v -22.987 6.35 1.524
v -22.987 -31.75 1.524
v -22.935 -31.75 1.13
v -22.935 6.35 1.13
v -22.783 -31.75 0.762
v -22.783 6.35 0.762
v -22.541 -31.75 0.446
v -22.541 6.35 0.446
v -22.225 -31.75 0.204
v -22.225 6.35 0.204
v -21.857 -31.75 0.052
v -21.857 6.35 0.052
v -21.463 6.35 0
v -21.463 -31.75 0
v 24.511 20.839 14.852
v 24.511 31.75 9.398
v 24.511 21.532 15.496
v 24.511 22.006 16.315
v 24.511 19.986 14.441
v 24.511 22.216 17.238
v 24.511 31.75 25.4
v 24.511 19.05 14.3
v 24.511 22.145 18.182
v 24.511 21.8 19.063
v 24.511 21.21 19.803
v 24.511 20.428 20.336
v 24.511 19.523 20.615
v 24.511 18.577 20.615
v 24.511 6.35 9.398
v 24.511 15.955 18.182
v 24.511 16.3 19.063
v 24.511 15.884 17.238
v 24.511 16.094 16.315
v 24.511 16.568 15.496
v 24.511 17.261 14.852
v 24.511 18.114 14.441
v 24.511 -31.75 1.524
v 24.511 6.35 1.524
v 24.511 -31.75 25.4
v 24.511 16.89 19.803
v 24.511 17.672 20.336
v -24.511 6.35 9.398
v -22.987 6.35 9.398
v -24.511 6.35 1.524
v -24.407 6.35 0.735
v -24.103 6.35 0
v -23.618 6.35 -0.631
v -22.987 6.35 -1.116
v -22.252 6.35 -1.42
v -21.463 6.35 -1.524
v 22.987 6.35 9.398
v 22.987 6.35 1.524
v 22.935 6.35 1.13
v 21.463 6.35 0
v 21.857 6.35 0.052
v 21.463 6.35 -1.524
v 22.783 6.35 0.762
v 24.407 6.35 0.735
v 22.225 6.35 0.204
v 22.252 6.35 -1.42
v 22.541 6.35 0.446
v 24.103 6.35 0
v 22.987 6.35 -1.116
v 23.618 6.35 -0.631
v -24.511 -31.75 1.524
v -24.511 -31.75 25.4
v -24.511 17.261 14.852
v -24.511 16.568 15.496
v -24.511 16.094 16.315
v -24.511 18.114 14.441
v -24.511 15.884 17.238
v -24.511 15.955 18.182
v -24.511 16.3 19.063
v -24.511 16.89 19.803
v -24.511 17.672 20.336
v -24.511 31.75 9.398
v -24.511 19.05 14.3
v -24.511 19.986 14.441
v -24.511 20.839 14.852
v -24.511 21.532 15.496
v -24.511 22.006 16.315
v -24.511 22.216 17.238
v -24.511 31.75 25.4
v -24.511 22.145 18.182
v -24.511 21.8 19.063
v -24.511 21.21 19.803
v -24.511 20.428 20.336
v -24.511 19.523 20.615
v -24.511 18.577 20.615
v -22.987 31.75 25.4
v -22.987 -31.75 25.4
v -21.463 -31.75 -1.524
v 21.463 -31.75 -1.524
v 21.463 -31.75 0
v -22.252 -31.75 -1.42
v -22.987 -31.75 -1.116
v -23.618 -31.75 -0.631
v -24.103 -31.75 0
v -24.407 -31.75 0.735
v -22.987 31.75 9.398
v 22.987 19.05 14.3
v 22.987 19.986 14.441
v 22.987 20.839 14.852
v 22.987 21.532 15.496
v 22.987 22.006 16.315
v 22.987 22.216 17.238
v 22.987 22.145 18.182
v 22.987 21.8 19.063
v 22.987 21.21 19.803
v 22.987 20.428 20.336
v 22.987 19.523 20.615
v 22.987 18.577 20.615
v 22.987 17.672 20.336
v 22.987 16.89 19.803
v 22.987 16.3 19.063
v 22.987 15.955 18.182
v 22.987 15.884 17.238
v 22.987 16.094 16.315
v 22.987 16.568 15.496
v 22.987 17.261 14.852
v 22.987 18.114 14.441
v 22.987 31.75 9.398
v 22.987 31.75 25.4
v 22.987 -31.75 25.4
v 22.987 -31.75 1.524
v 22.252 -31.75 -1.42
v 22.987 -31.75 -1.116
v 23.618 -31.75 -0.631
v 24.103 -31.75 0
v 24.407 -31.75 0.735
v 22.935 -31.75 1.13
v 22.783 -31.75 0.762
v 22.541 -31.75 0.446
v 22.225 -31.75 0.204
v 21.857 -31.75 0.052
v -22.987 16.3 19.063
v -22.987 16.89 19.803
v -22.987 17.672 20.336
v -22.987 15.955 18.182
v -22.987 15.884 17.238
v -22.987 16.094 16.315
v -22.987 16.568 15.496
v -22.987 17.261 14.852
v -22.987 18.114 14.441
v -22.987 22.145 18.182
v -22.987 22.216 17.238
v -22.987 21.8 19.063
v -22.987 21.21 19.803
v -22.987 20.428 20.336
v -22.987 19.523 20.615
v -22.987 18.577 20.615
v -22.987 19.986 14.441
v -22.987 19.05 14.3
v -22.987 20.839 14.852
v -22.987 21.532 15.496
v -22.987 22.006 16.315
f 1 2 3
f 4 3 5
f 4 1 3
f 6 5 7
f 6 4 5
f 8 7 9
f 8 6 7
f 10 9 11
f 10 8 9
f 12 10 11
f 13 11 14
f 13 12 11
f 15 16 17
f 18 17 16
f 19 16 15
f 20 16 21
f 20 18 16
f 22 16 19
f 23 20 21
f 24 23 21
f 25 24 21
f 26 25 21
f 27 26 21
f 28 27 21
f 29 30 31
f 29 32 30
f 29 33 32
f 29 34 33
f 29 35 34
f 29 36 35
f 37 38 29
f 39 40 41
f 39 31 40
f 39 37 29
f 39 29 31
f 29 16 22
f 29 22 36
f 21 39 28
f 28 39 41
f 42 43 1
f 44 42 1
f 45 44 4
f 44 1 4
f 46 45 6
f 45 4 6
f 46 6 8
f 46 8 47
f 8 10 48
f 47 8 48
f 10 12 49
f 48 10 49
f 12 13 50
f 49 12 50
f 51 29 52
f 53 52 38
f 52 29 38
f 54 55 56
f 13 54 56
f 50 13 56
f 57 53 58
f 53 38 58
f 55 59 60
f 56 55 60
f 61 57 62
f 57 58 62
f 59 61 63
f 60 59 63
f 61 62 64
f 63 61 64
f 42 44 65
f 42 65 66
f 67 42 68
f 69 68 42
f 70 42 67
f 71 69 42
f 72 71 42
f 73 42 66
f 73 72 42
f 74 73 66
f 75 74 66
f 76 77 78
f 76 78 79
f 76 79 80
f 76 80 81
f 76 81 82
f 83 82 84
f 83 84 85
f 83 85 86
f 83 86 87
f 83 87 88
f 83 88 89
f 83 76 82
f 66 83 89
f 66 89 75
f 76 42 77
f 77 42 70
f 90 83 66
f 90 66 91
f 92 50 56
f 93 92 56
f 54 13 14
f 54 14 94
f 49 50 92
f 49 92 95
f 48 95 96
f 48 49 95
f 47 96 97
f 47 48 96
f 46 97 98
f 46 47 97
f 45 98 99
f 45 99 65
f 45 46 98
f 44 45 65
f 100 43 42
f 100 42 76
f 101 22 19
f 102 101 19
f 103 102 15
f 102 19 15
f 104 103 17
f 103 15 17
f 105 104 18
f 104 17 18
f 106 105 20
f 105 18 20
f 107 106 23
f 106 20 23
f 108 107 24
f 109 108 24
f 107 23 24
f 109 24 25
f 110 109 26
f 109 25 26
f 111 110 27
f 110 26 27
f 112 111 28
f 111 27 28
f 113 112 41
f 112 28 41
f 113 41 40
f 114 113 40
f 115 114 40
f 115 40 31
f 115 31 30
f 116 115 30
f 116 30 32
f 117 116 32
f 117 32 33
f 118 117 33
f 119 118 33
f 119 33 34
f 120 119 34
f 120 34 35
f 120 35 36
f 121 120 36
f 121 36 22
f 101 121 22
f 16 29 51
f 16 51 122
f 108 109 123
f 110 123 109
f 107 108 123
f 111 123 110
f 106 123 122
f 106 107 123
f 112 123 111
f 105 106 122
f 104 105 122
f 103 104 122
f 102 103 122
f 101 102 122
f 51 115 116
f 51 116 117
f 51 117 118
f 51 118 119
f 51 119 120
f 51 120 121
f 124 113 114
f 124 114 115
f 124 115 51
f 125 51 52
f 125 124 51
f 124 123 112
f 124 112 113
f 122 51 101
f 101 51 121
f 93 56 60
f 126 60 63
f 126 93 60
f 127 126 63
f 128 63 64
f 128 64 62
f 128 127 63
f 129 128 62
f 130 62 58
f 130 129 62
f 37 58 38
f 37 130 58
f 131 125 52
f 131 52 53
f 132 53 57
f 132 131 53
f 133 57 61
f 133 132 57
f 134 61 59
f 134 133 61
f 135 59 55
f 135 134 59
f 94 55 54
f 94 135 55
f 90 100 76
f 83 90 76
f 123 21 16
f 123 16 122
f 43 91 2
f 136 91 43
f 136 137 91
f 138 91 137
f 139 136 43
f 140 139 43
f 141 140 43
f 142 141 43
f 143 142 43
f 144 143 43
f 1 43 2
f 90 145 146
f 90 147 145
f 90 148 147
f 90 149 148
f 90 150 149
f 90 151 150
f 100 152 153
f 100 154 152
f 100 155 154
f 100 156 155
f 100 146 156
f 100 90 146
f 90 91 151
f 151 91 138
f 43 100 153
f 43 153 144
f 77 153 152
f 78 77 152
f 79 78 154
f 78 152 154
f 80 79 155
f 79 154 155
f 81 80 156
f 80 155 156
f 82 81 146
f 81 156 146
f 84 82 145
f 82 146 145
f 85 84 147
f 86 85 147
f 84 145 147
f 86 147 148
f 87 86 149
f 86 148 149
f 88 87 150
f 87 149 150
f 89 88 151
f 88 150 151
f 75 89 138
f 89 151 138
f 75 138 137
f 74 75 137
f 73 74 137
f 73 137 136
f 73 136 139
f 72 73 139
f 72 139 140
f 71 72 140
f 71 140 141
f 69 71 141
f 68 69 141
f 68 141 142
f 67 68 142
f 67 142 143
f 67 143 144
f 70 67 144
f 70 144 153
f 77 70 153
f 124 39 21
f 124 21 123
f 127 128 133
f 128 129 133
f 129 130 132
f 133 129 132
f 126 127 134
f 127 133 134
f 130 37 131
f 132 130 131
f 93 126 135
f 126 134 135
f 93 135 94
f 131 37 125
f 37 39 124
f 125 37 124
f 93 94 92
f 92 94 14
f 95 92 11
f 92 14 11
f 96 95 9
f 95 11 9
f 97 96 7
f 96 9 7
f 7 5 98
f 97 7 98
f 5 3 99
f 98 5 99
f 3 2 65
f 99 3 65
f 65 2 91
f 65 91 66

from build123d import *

# Parameters (mm, degrees)
CROQUIS1_W                         = 49.022
CROQUIS1_H                         = 63.5
BRIDA_BASE1_DEPTH                  = 1.524
BRIDA_DE_ARISTA1_STRIP_W           = 9.144
BRIDA_DE_ARISTA1_STRIP_H           = 1.524
BRIDA_DE_ARISTA1_STRIP_CUT_DEPTH   = 63.5
BRIDA_DE_ARISTA1_STRIP_2_W         = 9.144
BRIDA_DE_ARISTA1_STRIP_2_H         = 1.524
BRIDA_DE_ARISTA1_STRIP_CUT_2_DEPTH = 63.5
BRIDA_DE_ARISTA1_DEPTH             = 63.5
BRIDA_DE_ARISTA1_BEND_DEPTH        = 63.5
CROQUIS23_R                        = 3.175
CROQUIS23_W                        = 10.922
CROQUIS23_H                        = 25.4
CORTAR_EXTRUIR4_DEPTH              = 73.66


# Sheet-metal steps are written as plain solids
with BuildPart() as part:
    # Croquis1 → Brida base1 (new body)
    with BuildSketch(Plane.XY):
        Rectangle(CROQUIS1_W, CROQUIS1_H)
    extrude(amount=-BRIDA_BASE1_DEPTH)

    # Brida de arista1 strip (across the edge) → Brida de arista1 strip cut (cut)
    with BuildSketch(Plane(origin=(24.511, -31.75, 0), x_dir=(-1, 0, 0), z_dir=(0, 1, 0))):
        with Locations((-1.524, -0.762)):
            Rectangle(BRIDA_DE_ARISTA1_STRIP_W, BRIDA_DE_ARISTA1_STRIP_H)
    extrude(amount=BRIDA_DE_ARISTA1_STRIP_CUT_DEPTH, mode=Mode.SUBTRACT)

    # Brida de arista1 strip 2 (across the edge) → Brida de arista1 strip cut 2 (cut)
    with BuildSketch(Plane(origin=(-24.511, 31.75, 0), x_dir=(1, 0, 0), z_dir=(0, -1, 0))):
        with Locations((-1.524, -0.762)):
            Rectangle(BRIDA_DE_ARISTA1_STRIP_2_W, BRIDA_DE_ARISTA1_STRIP_2_H)
    extrude(amount=BRIDA_DE_ARISTA1_STRIP_CUT_2_DEPTH, mode=Mode.SUBTRACT)

    # Brida de arista1 section (across the edge) → Brida de arista1 (add)
    with BuildSketch(Plane(origin=(24.511, -31.75, 0), x_dir=(-1, 0, 0), z_dir=(0, 1, 0))):
        with BuildLine():
            Line((0, 1.524), (0, 25.4))
            Line((0, 25.4), (1.524, 25.4))
            Line((1.524, 25.4), (1.524, 1.524))
            ThreePointArc((1.524, 1.524), (1.970369265, 0.446369265), (3.048, 0))
            Line((3.048, 0), (3.048, -1.524))
            ThreePointArc((3.048, -1.524), (0.892738531, -0.631261469), (0, 1.524))
        make_face()
    extrude(amount=BRIDA_DE_ARISTA1_DEPTH)

    # Brida de arista1 section 2 (across the edge) → Brida de arista1 bend (add)
    with BuildSketch(Plane(origin=(-24.511, 31.75, 0), x_dir=(1, 0, 0), z_dir=(0, -1, 0))):
        with BuildLine():
            Line((0, 1.524), (0, 25.4))
            Line((0, 25.4), (1.524, 25.4))
            Line((1.524, 25.4), (1.524, 1.524))
            ThreePointArc((1.524, 1.524), (1.970369265, 0.446369265), (3.048, 0))
            Line((3.048, 0), (3.048, -1.524))
            ThreePointArc((3.048, -1.524), (0.892738531, -0.631261469), (0, 1.524))
        make_face()
    extrude(amount=BRIDA_DE_ARISTA1_BEND_DEPTH)

    # Croquis23 → Cortar-Extruir4 (cut)
    with BuildSketch(Plane(origin=(24.511, 0, 0), x_dir=(0, 0, -1), z_dir=(1, 0, 0))):
        with Locations((-17.4752, 19.05)):
            Circle(CROQUIS23_R)
        with Locations((-3.937, 19.05)):
            Rectangle(CROQUIS23_W, CROQUIS23_H)
    extrude(amount=-CORTAR_EXTRUIR4_DEPTH, mode=Mode.SUBTRACT)


solid = part.part
